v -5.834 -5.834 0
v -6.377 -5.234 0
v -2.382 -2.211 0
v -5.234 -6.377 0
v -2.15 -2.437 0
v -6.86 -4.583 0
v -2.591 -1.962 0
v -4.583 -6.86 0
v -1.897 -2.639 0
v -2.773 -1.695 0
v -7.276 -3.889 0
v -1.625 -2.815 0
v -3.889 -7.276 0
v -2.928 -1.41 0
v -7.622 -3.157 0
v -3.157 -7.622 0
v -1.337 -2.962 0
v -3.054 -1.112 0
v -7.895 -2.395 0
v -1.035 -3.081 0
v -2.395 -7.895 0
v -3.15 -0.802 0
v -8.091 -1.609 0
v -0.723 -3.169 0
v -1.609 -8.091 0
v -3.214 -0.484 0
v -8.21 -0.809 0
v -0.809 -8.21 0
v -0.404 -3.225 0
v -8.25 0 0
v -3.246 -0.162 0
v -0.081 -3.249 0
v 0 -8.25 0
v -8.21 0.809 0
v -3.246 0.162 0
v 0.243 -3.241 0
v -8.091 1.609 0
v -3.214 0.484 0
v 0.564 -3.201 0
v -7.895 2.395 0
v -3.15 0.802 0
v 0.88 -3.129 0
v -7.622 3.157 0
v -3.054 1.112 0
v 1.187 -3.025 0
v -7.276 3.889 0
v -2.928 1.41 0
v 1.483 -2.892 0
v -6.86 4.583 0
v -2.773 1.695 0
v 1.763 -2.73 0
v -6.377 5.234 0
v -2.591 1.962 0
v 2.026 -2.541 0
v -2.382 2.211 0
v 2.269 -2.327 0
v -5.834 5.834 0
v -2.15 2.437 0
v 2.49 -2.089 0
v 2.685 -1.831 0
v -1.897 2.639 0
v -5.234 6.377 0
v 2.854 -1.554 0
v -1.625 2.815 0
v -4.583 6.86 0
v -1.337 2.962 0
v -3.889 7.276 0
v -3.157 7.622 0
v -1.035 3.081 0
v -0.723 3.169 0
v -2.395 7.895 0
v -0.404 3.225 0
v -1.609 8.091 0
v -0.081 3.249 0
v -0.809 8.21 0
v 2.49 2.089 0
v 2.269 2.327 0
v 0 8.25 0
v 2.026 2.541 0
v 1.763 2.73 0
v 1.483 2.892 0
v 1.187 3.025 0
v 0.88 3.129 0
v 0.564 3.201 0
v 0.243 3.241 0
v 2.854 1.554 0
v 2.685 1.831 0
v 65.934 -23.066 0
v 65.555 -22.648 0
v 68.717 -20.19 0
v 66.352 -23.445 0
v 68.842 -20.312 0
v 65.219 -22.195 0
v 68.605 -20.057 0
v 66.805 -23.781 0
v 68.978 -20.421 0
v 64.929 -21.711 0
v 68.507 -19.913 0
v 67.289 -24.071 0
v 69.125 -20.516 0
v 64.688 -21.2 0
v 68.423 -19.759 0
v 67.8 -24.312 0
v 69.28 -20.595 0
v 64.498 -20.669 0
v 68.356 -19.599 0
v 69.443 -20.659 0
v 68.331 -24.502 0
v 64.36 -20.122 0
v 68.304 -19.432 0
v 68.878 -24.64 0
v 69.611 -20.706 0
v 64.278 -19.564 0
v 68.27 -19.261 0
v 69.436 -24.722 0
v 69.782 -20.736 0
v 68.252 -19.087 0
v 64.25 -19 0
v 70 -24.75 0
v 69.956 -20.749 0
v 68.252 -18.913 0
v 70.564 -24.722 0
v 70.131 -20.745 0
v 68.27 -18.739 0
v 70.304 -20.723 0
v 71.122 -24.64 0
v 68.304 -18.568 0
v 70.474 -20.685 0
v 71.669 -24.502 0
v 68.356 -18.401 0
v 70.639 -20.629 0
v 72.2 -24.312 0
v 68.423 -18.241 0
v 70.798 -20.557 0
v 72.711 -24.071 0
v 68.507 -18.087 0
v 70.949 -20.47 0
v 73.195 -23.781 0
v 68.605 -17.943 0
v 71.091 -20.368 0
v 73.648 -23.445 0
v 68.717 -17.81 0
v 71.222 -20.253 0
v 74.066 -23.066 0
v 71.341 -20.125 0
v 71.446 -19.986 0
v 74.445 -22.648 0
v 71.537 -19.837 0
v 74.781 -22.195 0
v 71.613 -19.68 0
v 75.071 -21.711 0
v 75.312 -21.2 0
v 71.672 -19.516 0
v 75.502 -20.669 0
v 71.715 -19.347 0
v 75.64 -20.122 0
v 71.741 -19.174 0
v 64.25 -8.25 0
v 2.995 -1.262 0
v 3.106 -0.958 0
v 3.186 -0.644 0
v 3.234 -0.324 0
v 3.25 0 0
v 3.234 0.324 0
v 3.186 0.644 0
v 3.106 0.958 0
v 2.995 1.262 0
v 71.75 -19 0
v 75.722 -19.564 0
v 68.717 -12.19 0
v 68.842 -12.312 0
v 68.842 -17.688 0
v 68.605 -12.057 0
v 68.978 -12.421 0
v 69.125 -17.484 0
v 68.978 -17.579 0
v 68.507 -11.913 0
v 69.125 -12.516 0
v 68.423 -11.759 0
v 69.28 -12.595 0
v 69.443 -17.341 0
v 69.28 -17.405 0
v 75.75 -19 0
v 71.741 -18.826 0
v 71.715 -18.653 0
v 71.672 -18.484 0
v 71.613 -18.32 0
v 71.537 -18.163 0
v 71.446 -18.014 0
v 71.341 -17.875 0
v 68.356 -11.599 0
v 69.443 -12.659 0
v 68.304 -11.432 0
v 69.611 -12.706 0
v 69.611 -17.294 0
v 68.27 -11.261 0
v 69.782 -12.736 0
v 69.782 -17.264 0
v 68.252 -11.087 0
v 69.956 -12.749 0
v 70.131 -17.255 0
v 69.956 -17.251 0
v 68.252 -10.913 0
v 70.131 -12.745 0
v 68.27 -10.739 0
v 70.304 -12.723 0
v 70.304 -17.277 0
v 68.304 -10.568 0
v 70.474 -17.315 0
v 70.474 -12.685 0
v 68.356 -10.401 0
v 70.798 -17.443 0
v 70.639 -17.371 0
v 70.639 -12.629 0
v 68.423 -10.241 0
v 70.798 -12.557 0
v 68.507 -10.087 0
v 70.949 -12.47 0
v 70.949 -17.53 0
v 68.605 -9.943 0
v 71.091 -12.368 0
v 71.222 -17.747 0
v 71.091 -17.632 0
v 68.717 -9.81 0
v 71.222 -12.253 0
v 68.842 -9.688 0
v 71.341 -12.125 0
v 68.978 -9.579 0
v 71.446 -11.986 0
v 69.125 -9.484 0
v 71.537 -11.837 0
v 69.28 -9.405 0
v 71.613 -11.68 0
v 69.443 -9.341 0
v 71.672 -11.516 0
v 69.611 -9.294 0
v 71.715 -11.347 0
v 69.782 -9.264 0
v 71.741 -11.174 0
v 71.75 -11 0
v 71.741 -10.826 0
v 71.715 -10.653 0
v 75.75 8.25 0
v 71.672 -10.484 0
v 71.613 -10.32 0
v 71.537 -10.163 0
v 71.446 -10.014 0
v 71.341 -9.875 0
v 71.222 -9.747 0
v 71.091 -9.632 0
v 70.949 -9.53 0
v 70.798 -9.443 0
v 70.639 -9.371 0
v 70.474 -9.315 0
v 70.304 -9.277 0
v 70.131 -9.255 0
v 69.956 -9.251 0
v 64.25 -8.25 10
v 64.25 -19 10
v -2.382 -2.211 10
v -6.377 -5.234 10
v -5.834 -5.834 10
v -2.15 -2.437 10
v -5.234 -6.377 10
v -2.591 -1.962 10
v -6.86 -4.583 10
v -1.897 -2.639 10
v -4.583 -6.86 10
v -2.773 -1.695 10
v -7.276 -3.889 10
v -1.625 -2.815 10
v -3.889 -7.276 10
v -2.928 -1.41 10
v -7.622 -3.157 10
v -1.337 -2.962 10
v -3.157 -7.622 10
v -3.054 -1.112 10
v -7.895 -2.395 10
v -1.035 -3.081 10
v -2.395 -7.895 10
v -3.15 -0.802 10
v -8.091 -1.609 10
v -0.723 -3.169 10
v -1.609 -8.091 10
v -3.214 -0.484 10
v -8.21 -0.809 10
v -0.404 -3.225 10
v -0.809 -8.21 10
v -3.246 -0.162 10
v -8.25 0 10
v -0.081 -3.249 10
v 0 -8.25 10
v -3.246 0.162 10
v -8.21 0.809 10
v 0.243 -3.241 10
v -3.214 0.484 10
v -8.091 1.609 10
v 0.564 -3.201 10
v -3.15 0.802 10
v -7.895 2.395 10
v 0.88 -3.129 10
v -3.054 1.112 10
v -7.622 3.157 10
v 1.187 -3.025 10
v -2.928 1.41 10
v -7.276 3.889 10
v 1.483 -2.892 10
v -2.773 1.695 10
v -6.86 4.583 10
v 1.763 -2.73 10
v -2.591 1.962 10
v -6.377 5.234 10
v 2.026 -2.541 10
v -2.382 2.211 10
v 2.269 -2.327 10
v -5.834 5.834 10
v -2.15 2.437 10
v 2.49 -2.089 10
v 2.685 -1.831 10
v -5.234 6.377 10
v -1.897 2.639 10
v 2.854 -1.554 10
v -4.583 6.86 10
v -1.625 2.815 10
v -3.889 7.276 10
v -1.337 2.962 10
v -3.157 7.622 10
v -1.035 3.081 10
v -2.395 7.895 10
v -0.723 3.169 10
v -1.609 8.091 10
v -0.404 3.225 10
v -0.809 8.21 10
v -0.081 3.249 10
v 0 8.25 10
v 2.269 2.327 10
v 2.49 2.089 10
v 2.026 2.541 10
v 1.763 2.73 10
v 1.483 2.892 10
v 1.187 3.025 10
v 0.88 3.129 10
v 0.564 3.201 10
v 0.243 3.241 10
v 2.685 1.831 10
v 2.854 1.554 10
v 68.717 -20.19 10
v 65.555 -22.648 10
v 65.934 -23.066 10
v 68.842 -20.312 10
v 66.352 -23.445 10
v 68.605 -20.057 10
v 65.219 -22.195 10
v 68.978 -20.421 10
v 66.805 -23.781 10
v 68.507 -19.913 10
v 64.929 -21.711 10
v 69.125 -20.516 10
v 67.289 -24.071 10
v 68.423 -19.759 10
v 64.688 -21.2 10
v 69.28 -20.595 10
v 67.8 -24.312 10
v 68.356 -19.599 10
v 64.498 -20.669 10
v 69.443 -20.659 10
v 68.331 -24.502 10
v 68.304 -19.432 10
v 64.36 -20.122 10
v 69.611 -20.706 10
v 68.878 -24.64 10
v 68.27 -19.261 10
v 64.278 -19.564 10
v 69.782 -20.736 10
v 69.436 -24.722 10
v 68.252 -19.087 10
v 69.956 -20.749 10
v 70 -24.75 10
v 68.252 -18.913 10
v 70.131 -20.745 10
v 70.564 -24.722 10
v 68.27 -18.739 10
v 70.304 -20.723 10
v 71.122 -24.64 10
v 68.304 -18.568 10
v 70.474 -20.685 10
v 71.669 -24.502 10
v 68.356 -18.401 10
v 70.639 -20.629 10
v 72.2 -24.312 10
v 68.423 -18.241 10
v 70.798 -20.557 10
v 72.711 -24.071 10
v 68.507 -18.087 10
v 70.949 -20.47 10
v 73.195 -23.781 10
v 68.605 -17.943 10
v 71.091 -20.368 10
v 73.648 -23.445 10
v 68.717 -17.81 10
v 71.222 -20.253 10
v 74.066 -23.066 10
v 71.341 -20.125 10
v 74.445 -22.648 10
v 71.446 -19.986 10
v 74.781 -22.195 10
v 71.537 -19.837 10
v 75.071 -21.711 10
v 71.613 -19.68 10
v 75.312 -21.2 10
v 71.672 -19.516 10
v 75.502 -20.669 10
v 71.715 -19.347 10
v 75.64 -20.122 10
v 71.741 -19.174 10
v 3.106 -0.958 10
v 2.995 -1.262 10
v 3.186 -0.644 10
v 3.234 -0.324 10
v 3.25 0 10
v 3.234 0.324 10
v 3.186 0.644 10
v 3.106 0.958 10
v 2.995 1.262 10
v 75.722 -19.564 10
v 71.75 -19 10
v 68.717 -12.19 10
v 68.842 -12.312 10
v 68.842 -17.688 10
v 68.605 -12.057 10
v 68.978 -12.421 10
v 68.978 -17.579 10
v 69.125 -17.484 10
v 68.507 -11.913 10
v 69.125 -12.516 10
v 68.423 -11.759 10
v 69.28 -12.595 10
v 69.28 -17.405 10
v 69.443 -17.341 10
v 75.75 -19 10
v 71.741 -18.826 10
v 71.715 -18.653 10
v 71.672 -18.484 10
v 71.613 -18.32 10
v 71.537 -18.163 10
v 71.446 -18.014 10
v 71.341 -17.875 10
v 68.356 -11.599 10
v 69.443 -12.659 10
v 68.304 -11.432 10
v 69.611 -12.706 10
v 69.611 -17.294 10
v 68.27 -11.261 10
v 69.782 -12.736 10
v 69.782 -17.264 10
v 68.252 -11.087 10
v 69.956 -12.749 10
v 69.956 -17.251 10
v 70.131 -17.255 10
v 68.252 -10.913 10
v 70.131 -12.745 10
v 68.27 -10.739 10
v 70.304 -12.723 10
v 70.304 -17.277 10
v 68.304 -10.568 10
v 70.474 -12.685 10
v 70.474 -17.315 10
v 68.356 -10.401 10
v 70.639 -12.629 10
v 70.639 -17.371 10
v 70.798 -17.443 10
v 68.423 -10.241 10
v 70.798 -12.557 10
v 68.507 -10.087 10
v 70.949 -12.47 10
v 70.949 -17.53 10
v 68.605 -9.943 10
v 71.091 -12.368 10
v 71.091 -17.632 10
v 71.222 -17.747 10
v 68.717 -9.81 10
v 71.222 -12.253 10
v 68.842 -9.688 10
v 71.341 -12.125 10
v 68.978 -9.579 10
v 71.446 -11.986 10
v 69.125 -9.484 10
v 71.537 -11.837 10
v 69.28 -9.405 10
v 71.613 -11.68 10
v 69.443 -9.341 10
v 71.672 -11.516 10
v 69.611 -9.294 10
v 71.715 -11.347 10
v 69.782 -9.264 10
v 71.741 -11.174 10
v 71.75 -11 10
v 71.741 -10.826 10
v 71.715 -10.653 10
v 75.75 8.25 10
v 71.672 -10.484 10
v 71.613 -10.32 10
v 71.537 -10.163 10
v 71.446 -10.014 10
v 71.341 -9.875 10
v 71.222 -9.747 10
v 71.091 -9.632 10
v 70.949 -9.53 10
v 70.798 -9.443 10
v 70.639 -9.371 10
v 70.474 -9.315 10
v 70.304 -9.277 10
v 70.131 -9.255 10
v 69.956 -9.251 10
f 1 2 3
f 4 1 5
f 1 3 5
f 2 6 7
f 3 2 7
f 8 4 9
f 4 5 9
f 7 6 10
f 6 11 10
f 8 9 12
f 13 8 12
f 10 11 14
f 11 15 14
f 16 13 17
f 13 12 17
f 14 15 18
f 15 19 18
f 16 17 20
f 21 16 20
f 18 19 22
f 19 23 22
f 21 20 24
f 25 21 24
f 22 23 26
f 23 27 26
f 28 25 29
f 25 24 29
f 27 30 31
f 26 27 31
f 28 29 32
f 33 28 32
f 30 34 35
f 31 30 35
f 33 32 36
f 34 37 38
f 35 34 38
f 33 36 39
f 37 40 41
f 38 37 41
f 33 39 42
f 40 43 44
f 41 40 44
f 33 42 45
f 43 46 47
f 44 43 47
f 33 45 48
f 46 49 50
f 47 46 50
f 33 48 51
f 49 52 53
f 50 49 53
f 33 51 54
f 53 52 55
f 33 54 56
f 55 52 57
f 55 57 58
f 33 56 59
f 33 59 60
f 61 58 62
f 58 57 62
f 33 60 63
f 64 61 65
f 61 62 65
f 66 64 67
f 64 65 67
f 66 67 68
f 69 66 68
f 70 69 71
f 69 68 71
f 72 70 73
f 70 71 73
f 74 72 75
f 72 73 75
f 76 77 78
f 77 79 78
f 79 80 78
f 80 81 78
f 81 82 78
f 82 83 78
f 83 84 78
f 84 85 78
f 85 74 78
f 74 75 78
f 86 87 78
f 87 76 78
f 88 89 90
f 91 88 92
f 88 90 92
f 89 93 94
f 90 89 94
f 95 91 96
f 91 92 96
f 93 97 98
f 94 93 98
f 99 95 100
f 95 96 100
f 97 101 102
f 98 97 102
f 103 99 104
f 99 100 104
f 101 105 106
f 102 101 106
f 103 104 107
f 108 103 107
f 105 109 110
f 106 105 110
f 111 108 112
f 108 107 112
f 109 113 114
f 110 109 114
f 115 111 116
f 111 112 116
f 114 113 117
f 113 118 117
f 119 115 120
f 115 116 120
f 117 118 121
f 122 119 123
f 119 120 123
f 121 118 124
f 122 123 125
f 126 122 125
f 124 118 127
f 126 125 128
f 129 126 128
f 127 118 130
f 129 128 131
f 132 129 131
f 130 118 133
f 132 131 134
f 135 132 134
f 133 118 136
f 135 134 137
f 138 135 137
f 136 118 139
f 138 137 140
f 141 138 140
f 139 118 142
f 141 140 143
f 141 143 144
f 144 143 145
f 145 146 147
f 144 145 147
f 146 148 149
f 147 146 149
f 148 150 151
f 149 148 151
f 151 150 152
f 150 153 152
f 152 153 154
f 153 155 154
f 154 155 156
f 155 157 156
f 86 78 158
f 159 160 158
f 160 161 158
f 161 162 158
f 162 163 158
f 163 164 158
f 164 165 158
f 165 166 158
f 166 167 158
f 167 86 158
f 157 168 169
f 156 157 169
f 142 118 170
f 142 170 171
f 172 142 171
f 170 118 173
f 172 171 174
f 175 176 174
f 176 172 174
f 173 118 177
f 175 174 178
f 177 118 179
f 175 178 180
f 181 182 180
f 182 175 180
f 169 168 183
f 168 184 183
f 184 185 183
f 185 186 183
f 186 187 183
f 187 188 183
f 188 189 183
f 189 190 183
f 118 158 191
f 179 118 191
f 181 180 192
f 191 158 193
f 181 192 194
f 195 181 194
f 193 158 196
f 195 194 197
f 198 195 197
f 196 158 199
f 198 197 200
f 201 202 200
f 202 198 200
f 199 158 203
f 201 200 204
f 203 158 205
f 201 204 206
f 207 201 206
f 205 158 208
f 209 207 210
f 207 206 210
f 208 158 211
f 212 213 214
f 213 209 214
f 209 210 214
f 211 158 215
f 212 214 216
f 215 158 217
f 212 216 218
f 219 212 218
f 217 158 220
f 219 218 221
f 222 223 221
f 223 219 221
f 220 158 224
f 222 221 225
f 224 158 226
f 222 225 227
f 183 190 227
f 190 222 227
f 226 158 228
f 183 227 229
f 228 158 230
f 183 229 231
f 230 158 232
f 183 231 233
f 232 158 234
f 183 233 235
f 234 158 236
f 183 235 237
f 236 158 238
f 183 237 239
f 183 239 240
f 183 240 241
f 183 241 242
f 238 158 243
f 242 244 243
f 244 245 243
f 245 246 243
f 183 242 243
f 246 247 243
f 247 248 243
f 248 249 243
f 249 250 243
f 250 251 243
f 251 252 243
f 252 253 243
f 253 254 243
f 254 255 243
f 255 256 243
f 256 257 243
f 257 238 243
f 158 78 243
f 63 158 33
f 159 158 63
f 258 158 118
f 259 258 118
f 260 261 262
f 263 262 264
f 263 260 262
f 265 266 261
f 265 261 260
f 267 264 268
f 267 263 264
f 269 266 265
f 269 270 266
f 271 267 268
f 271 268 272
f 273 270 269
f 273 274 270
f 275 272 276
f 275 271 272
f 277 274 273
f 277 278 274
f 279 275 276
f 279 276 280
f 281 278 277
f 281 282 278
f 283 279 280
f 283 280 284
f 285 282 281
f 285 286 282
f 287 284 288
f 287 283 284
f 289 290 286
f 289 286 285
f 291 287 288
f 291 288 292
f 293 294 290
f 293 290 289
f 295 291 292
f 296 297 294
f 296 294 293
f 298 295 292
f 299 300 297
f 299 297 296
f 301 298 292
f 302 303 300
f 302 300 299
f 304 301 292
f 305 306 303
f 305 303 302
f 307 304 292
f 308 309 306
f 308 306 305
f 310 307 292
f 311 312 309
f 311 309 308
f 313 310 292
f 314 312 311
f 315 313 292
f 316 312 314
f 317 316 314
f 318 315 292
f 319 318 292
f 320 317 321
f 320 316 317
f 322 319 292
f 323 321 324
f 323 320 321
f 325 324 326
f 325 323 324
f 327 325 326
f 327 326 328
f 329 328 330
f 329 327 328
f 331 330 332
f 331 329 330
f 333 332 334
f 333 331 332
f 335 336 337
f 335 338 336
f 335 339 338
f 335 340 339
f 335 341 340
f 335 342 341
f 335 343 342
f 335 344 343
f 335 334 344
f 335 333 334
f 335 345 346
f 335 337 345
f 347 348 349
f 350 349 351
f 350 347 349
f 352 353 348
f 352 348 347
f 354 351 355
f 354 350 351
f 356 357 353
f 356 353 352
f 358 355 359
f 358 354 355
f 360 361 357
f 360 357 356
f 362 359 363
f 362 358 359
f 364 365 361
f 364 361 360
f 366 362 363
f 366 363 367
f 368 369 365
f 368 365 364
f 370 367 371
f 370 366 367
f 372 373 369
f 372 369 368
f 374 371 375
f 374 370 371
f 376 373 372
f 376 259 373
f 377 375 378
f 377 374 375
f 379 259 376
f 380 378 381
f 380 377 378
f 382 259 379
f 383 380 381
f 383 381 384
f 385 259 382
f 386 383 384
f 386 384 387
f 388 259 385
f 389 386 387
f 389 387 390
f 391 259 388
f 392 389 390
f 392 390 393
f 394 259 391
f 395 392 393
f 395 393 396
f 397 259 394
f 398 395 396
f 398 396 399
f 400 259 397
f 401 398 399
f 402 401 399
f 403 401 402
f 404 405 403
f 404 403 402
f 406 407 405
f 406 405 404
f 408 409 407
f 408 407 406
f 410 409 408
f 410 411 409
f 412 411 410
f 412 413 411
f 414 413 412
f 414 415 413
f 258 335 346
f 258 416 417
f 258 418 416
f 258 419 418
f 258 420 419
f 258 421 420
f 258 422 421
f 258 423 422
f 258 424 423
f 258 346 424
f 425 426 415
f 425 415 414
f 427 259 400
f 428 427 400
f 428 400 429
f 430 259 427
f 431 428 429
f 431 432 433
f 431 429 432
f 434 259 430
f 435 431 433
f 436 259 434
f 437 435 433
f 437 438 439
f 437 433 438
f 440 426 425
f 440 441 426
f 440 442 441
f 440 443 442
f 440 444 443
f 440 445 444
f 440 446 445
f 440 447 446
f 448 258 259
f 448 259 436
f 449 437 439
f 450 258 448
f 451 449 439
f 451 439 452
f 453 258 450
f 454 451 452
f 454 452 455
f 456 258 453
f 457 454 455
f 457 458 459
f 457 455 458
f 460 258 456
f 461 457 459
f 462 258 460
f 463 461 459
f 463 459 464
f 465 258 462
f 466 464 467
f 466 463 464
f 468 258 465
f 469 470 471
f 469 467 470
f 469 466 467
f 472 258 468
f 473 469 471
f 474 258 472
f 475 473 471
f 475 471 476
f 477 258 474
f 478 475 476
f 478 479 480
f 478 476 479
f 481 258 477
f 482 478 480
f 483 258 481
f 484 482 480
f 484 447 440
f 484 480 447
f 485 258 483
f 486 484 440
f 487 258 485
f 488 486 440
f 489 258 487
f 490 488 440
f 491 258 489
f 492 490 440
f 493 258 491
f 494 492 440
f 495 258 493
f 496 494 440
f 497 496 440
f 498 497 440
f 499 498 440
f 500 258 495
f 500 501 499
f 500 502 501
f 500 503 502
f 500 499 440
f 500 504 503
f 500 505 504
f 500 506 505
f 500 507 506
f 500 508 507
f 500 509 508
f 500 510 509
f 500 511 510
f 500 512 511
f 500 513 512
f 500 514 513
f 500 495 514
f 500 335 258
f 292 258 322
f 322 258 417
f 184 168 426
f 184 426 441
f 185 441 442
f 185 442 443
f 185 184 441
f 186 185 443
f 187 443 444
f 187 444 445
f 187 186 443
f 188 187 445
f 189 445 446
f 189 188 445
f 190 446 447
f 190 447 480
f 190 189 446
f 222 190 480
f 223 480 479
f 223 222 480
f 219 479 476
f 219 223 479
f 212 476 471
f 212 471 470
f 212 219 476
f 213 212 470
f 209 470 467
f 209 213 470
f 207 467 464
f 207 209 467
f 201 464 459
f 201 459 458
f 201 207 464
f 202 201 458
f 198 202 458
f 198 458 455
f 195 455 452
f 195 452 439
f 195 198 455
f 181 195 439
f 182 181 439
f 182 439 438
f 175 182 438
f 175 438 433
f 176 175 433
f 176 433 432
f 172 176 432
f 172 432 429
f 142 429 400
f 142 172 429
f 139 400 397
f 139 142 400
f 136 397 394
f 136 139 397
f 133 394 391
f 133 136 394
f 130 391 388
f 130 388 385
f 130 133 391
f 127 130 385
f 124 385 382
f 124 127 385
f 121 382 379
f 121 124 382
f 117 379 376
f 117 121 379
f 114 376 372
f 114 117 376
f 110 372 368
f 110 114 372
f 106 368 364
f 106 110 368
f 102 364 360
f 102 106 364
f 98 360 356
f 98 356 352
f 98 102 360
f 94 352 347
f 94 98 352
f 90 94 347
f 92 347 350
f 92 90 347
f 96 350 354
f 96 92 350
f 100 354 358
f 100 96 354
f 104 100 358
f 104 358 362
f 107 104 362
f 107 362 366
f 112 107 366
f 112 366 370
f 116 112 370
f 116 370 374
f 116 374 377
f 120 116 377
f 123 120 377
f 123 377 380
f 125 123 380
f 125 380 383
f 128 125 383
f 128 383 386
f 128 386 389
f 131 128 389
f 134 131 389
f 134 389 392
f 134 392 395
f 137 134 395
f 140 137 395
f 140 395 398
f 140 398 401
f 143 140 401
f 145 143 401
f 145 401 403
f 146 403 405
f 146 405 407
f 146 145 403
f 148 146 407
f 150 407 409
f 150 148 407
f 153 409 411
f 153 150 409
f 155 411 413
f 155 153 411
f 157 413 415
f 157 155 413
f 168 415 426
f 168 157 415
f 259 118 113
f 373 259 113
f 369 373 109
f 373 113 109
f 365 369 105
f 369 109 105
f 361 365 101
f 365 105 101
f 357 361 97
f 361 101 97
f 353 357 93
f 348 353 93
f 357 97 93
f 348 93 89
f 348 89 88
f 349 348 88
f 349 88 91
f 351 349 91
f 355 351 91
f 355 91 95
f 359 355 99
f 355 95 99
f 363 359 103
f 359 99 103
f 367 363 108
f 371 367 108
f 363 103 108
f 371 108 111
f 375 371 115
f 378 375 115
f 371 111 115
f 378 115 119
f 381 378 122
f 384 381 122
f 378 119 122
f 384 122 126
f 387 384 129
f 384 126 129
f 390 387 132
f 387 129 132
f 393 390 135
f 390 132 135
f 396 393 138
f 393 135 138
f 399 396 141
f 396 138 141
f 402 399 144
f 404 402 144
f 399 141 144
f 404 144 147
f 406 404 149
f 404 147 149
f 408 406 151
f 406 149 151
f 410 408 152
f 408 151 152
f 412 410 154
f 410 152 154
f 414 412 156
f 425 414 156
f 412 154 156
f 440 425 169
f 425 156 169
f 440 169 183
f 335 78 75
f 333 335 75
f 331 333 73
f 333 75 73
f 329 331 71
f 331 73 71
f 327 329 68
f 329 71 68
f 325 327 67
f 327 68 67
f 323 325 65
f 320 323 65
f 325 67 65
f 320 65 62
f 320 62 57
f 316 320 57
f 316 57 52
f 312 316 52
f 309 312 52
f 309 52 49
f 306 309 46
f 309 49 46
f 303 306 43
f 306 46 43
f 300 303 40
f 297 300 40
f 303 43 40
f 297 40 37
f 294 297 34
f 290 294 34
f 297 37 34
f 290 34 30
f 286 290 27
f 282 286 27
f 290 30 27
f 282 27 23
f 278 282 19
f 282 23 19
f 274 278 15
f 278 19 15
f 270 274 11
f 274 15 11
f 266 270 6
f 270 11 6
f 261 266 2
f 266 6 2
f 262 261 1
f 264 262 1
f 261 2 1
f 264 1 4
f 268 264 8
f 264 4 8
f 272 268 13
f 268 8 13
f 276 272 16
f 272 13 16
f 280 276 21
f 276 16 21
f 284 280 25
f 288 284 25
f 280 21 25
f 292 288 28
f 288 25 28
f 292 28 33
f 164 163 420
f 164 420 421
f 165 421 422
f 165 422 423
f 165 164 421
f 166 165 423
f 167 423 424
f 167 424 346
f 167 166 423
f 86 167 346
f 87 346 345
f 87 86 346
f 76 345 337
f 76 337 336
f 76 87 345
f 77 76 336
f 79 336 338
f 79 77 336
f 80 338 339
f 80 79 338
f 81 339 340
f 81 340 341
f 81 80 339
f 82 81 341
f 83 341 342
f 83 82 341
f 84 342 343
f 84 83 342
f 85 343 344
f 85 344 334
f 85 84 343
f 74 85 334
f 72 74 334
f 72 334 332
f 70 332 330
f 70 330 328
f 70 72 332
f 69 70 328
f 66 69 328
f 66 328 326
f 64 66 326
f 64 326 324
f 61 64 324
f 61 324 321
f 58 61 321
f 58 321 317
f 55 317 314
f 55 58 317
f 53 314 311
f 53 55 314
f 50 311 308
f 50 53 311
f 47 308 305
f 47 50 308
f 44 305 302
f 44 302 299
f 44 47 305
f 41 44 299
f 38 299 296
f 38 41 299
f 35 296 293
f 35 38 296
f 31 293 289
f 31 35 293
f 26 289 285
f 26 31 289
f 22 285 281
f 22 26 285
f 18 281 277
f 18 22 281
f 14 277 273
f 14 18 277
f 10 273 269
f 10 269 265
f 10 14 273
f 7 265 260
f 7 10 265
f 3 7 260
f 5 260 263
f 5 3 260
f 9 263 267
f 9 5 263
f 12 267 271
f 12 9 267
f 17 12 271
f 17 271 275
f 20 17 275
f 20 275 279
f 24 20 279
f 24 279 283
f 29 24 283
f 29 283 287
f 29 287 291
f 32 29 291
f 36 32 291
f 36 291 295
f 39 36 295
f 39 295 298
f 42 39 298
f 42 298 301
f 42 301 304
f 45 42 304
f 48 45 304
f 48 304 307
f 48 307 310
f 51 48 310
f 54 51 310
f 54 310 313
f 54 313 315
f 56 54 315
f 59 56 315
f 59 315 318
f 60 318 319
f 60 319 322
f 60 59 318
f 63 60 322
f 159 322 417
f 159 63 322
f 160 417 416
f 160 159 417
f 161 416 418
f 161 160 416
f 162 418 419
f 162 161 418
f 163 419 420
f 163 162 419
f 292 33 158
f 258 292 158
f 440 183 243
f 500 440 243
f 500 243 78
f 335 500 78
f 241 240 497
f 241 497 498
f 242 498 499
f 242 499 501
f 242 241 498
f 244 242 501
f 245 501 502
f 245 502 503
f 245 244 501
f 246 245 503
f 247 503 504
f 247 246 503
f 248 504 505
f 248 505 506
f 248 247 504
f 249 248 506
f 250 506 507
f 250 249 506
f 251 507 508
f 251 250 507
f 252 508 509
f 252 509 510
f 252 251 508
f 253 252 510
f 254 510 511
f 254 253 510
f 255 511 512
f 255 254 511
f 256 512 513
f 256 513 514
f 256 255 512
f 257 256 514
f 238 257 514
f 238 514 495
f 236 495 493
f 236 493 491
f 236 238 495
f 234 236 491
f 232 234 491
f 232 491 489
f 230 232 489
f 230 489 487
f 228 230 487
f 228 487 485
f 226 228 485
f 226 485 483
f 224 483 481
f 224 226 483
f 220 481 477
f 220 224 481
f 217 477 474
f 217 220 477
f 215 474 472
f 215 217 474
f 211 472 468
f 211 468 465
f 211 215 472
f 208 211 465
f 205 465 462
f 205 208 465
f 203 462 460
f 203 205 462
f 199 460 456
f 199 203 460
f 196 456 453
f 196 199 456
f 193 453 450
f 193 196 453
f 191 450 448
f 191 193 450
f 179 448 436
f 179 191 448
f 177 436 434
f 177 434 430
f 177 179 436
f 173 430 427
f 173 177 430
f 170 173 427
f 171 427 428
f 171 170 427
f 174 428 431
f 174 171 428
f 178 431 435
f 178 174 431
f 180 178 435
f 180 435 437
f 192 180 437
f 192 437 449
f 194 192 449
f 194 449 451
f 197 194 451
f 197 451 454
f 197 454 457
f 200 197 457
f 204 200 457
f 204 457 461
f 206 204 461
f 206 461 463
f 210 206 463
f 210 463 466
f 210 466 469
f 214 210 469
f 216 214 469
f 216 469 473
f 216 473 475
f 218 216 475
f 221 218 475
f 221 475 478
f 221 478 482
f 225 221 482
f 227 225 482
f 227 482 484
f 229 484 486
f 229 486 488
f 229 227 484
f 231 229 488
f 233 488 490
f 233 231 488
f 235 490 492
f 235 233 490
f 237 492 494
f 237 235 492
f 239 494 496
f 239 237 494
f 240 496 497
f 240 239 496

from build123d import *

# Parameters (mm, degrees)
SKETCH1_R           = 3.25
SKETCH1_R_2         = 1.75
BOSS_EXTRUDE1_DEPTH = 10


with BuildPart() as part:
    # Sketch1 → Boss-Extrude1 (new body)
    with BuildSketch(Plane.XY):
        with BuildLine():
            Line((75.75, 8.25), (0, 8.25))
            ThreePointArc((0, 8.25), (-8.25, 0), (0, -8.25))
            Line((0, -8.25), (64.25, -8.25))
            Line((64.25, -8.25), (64.25, -19))
            ThreePointArc((64.25, -19), (70, -24.75), (75.75, -19))
            Line((75.75, -19), (75.75, 8.25))
        make_face()
        Circle(SKETCH1_R, mode=Mode.SUBTRACT)
        with Locations((70, -11)):
            Circle(SKETCH1_R_2, mode=Mode.SUBTRACT)
        with Locations((70, -19)):
            Circle(SKETCH1_R_2, mode=Mode.SUBTRACT)
    extrude(amount=BOSS_EXTRUDE1_DEPTH)


solid = part.part
